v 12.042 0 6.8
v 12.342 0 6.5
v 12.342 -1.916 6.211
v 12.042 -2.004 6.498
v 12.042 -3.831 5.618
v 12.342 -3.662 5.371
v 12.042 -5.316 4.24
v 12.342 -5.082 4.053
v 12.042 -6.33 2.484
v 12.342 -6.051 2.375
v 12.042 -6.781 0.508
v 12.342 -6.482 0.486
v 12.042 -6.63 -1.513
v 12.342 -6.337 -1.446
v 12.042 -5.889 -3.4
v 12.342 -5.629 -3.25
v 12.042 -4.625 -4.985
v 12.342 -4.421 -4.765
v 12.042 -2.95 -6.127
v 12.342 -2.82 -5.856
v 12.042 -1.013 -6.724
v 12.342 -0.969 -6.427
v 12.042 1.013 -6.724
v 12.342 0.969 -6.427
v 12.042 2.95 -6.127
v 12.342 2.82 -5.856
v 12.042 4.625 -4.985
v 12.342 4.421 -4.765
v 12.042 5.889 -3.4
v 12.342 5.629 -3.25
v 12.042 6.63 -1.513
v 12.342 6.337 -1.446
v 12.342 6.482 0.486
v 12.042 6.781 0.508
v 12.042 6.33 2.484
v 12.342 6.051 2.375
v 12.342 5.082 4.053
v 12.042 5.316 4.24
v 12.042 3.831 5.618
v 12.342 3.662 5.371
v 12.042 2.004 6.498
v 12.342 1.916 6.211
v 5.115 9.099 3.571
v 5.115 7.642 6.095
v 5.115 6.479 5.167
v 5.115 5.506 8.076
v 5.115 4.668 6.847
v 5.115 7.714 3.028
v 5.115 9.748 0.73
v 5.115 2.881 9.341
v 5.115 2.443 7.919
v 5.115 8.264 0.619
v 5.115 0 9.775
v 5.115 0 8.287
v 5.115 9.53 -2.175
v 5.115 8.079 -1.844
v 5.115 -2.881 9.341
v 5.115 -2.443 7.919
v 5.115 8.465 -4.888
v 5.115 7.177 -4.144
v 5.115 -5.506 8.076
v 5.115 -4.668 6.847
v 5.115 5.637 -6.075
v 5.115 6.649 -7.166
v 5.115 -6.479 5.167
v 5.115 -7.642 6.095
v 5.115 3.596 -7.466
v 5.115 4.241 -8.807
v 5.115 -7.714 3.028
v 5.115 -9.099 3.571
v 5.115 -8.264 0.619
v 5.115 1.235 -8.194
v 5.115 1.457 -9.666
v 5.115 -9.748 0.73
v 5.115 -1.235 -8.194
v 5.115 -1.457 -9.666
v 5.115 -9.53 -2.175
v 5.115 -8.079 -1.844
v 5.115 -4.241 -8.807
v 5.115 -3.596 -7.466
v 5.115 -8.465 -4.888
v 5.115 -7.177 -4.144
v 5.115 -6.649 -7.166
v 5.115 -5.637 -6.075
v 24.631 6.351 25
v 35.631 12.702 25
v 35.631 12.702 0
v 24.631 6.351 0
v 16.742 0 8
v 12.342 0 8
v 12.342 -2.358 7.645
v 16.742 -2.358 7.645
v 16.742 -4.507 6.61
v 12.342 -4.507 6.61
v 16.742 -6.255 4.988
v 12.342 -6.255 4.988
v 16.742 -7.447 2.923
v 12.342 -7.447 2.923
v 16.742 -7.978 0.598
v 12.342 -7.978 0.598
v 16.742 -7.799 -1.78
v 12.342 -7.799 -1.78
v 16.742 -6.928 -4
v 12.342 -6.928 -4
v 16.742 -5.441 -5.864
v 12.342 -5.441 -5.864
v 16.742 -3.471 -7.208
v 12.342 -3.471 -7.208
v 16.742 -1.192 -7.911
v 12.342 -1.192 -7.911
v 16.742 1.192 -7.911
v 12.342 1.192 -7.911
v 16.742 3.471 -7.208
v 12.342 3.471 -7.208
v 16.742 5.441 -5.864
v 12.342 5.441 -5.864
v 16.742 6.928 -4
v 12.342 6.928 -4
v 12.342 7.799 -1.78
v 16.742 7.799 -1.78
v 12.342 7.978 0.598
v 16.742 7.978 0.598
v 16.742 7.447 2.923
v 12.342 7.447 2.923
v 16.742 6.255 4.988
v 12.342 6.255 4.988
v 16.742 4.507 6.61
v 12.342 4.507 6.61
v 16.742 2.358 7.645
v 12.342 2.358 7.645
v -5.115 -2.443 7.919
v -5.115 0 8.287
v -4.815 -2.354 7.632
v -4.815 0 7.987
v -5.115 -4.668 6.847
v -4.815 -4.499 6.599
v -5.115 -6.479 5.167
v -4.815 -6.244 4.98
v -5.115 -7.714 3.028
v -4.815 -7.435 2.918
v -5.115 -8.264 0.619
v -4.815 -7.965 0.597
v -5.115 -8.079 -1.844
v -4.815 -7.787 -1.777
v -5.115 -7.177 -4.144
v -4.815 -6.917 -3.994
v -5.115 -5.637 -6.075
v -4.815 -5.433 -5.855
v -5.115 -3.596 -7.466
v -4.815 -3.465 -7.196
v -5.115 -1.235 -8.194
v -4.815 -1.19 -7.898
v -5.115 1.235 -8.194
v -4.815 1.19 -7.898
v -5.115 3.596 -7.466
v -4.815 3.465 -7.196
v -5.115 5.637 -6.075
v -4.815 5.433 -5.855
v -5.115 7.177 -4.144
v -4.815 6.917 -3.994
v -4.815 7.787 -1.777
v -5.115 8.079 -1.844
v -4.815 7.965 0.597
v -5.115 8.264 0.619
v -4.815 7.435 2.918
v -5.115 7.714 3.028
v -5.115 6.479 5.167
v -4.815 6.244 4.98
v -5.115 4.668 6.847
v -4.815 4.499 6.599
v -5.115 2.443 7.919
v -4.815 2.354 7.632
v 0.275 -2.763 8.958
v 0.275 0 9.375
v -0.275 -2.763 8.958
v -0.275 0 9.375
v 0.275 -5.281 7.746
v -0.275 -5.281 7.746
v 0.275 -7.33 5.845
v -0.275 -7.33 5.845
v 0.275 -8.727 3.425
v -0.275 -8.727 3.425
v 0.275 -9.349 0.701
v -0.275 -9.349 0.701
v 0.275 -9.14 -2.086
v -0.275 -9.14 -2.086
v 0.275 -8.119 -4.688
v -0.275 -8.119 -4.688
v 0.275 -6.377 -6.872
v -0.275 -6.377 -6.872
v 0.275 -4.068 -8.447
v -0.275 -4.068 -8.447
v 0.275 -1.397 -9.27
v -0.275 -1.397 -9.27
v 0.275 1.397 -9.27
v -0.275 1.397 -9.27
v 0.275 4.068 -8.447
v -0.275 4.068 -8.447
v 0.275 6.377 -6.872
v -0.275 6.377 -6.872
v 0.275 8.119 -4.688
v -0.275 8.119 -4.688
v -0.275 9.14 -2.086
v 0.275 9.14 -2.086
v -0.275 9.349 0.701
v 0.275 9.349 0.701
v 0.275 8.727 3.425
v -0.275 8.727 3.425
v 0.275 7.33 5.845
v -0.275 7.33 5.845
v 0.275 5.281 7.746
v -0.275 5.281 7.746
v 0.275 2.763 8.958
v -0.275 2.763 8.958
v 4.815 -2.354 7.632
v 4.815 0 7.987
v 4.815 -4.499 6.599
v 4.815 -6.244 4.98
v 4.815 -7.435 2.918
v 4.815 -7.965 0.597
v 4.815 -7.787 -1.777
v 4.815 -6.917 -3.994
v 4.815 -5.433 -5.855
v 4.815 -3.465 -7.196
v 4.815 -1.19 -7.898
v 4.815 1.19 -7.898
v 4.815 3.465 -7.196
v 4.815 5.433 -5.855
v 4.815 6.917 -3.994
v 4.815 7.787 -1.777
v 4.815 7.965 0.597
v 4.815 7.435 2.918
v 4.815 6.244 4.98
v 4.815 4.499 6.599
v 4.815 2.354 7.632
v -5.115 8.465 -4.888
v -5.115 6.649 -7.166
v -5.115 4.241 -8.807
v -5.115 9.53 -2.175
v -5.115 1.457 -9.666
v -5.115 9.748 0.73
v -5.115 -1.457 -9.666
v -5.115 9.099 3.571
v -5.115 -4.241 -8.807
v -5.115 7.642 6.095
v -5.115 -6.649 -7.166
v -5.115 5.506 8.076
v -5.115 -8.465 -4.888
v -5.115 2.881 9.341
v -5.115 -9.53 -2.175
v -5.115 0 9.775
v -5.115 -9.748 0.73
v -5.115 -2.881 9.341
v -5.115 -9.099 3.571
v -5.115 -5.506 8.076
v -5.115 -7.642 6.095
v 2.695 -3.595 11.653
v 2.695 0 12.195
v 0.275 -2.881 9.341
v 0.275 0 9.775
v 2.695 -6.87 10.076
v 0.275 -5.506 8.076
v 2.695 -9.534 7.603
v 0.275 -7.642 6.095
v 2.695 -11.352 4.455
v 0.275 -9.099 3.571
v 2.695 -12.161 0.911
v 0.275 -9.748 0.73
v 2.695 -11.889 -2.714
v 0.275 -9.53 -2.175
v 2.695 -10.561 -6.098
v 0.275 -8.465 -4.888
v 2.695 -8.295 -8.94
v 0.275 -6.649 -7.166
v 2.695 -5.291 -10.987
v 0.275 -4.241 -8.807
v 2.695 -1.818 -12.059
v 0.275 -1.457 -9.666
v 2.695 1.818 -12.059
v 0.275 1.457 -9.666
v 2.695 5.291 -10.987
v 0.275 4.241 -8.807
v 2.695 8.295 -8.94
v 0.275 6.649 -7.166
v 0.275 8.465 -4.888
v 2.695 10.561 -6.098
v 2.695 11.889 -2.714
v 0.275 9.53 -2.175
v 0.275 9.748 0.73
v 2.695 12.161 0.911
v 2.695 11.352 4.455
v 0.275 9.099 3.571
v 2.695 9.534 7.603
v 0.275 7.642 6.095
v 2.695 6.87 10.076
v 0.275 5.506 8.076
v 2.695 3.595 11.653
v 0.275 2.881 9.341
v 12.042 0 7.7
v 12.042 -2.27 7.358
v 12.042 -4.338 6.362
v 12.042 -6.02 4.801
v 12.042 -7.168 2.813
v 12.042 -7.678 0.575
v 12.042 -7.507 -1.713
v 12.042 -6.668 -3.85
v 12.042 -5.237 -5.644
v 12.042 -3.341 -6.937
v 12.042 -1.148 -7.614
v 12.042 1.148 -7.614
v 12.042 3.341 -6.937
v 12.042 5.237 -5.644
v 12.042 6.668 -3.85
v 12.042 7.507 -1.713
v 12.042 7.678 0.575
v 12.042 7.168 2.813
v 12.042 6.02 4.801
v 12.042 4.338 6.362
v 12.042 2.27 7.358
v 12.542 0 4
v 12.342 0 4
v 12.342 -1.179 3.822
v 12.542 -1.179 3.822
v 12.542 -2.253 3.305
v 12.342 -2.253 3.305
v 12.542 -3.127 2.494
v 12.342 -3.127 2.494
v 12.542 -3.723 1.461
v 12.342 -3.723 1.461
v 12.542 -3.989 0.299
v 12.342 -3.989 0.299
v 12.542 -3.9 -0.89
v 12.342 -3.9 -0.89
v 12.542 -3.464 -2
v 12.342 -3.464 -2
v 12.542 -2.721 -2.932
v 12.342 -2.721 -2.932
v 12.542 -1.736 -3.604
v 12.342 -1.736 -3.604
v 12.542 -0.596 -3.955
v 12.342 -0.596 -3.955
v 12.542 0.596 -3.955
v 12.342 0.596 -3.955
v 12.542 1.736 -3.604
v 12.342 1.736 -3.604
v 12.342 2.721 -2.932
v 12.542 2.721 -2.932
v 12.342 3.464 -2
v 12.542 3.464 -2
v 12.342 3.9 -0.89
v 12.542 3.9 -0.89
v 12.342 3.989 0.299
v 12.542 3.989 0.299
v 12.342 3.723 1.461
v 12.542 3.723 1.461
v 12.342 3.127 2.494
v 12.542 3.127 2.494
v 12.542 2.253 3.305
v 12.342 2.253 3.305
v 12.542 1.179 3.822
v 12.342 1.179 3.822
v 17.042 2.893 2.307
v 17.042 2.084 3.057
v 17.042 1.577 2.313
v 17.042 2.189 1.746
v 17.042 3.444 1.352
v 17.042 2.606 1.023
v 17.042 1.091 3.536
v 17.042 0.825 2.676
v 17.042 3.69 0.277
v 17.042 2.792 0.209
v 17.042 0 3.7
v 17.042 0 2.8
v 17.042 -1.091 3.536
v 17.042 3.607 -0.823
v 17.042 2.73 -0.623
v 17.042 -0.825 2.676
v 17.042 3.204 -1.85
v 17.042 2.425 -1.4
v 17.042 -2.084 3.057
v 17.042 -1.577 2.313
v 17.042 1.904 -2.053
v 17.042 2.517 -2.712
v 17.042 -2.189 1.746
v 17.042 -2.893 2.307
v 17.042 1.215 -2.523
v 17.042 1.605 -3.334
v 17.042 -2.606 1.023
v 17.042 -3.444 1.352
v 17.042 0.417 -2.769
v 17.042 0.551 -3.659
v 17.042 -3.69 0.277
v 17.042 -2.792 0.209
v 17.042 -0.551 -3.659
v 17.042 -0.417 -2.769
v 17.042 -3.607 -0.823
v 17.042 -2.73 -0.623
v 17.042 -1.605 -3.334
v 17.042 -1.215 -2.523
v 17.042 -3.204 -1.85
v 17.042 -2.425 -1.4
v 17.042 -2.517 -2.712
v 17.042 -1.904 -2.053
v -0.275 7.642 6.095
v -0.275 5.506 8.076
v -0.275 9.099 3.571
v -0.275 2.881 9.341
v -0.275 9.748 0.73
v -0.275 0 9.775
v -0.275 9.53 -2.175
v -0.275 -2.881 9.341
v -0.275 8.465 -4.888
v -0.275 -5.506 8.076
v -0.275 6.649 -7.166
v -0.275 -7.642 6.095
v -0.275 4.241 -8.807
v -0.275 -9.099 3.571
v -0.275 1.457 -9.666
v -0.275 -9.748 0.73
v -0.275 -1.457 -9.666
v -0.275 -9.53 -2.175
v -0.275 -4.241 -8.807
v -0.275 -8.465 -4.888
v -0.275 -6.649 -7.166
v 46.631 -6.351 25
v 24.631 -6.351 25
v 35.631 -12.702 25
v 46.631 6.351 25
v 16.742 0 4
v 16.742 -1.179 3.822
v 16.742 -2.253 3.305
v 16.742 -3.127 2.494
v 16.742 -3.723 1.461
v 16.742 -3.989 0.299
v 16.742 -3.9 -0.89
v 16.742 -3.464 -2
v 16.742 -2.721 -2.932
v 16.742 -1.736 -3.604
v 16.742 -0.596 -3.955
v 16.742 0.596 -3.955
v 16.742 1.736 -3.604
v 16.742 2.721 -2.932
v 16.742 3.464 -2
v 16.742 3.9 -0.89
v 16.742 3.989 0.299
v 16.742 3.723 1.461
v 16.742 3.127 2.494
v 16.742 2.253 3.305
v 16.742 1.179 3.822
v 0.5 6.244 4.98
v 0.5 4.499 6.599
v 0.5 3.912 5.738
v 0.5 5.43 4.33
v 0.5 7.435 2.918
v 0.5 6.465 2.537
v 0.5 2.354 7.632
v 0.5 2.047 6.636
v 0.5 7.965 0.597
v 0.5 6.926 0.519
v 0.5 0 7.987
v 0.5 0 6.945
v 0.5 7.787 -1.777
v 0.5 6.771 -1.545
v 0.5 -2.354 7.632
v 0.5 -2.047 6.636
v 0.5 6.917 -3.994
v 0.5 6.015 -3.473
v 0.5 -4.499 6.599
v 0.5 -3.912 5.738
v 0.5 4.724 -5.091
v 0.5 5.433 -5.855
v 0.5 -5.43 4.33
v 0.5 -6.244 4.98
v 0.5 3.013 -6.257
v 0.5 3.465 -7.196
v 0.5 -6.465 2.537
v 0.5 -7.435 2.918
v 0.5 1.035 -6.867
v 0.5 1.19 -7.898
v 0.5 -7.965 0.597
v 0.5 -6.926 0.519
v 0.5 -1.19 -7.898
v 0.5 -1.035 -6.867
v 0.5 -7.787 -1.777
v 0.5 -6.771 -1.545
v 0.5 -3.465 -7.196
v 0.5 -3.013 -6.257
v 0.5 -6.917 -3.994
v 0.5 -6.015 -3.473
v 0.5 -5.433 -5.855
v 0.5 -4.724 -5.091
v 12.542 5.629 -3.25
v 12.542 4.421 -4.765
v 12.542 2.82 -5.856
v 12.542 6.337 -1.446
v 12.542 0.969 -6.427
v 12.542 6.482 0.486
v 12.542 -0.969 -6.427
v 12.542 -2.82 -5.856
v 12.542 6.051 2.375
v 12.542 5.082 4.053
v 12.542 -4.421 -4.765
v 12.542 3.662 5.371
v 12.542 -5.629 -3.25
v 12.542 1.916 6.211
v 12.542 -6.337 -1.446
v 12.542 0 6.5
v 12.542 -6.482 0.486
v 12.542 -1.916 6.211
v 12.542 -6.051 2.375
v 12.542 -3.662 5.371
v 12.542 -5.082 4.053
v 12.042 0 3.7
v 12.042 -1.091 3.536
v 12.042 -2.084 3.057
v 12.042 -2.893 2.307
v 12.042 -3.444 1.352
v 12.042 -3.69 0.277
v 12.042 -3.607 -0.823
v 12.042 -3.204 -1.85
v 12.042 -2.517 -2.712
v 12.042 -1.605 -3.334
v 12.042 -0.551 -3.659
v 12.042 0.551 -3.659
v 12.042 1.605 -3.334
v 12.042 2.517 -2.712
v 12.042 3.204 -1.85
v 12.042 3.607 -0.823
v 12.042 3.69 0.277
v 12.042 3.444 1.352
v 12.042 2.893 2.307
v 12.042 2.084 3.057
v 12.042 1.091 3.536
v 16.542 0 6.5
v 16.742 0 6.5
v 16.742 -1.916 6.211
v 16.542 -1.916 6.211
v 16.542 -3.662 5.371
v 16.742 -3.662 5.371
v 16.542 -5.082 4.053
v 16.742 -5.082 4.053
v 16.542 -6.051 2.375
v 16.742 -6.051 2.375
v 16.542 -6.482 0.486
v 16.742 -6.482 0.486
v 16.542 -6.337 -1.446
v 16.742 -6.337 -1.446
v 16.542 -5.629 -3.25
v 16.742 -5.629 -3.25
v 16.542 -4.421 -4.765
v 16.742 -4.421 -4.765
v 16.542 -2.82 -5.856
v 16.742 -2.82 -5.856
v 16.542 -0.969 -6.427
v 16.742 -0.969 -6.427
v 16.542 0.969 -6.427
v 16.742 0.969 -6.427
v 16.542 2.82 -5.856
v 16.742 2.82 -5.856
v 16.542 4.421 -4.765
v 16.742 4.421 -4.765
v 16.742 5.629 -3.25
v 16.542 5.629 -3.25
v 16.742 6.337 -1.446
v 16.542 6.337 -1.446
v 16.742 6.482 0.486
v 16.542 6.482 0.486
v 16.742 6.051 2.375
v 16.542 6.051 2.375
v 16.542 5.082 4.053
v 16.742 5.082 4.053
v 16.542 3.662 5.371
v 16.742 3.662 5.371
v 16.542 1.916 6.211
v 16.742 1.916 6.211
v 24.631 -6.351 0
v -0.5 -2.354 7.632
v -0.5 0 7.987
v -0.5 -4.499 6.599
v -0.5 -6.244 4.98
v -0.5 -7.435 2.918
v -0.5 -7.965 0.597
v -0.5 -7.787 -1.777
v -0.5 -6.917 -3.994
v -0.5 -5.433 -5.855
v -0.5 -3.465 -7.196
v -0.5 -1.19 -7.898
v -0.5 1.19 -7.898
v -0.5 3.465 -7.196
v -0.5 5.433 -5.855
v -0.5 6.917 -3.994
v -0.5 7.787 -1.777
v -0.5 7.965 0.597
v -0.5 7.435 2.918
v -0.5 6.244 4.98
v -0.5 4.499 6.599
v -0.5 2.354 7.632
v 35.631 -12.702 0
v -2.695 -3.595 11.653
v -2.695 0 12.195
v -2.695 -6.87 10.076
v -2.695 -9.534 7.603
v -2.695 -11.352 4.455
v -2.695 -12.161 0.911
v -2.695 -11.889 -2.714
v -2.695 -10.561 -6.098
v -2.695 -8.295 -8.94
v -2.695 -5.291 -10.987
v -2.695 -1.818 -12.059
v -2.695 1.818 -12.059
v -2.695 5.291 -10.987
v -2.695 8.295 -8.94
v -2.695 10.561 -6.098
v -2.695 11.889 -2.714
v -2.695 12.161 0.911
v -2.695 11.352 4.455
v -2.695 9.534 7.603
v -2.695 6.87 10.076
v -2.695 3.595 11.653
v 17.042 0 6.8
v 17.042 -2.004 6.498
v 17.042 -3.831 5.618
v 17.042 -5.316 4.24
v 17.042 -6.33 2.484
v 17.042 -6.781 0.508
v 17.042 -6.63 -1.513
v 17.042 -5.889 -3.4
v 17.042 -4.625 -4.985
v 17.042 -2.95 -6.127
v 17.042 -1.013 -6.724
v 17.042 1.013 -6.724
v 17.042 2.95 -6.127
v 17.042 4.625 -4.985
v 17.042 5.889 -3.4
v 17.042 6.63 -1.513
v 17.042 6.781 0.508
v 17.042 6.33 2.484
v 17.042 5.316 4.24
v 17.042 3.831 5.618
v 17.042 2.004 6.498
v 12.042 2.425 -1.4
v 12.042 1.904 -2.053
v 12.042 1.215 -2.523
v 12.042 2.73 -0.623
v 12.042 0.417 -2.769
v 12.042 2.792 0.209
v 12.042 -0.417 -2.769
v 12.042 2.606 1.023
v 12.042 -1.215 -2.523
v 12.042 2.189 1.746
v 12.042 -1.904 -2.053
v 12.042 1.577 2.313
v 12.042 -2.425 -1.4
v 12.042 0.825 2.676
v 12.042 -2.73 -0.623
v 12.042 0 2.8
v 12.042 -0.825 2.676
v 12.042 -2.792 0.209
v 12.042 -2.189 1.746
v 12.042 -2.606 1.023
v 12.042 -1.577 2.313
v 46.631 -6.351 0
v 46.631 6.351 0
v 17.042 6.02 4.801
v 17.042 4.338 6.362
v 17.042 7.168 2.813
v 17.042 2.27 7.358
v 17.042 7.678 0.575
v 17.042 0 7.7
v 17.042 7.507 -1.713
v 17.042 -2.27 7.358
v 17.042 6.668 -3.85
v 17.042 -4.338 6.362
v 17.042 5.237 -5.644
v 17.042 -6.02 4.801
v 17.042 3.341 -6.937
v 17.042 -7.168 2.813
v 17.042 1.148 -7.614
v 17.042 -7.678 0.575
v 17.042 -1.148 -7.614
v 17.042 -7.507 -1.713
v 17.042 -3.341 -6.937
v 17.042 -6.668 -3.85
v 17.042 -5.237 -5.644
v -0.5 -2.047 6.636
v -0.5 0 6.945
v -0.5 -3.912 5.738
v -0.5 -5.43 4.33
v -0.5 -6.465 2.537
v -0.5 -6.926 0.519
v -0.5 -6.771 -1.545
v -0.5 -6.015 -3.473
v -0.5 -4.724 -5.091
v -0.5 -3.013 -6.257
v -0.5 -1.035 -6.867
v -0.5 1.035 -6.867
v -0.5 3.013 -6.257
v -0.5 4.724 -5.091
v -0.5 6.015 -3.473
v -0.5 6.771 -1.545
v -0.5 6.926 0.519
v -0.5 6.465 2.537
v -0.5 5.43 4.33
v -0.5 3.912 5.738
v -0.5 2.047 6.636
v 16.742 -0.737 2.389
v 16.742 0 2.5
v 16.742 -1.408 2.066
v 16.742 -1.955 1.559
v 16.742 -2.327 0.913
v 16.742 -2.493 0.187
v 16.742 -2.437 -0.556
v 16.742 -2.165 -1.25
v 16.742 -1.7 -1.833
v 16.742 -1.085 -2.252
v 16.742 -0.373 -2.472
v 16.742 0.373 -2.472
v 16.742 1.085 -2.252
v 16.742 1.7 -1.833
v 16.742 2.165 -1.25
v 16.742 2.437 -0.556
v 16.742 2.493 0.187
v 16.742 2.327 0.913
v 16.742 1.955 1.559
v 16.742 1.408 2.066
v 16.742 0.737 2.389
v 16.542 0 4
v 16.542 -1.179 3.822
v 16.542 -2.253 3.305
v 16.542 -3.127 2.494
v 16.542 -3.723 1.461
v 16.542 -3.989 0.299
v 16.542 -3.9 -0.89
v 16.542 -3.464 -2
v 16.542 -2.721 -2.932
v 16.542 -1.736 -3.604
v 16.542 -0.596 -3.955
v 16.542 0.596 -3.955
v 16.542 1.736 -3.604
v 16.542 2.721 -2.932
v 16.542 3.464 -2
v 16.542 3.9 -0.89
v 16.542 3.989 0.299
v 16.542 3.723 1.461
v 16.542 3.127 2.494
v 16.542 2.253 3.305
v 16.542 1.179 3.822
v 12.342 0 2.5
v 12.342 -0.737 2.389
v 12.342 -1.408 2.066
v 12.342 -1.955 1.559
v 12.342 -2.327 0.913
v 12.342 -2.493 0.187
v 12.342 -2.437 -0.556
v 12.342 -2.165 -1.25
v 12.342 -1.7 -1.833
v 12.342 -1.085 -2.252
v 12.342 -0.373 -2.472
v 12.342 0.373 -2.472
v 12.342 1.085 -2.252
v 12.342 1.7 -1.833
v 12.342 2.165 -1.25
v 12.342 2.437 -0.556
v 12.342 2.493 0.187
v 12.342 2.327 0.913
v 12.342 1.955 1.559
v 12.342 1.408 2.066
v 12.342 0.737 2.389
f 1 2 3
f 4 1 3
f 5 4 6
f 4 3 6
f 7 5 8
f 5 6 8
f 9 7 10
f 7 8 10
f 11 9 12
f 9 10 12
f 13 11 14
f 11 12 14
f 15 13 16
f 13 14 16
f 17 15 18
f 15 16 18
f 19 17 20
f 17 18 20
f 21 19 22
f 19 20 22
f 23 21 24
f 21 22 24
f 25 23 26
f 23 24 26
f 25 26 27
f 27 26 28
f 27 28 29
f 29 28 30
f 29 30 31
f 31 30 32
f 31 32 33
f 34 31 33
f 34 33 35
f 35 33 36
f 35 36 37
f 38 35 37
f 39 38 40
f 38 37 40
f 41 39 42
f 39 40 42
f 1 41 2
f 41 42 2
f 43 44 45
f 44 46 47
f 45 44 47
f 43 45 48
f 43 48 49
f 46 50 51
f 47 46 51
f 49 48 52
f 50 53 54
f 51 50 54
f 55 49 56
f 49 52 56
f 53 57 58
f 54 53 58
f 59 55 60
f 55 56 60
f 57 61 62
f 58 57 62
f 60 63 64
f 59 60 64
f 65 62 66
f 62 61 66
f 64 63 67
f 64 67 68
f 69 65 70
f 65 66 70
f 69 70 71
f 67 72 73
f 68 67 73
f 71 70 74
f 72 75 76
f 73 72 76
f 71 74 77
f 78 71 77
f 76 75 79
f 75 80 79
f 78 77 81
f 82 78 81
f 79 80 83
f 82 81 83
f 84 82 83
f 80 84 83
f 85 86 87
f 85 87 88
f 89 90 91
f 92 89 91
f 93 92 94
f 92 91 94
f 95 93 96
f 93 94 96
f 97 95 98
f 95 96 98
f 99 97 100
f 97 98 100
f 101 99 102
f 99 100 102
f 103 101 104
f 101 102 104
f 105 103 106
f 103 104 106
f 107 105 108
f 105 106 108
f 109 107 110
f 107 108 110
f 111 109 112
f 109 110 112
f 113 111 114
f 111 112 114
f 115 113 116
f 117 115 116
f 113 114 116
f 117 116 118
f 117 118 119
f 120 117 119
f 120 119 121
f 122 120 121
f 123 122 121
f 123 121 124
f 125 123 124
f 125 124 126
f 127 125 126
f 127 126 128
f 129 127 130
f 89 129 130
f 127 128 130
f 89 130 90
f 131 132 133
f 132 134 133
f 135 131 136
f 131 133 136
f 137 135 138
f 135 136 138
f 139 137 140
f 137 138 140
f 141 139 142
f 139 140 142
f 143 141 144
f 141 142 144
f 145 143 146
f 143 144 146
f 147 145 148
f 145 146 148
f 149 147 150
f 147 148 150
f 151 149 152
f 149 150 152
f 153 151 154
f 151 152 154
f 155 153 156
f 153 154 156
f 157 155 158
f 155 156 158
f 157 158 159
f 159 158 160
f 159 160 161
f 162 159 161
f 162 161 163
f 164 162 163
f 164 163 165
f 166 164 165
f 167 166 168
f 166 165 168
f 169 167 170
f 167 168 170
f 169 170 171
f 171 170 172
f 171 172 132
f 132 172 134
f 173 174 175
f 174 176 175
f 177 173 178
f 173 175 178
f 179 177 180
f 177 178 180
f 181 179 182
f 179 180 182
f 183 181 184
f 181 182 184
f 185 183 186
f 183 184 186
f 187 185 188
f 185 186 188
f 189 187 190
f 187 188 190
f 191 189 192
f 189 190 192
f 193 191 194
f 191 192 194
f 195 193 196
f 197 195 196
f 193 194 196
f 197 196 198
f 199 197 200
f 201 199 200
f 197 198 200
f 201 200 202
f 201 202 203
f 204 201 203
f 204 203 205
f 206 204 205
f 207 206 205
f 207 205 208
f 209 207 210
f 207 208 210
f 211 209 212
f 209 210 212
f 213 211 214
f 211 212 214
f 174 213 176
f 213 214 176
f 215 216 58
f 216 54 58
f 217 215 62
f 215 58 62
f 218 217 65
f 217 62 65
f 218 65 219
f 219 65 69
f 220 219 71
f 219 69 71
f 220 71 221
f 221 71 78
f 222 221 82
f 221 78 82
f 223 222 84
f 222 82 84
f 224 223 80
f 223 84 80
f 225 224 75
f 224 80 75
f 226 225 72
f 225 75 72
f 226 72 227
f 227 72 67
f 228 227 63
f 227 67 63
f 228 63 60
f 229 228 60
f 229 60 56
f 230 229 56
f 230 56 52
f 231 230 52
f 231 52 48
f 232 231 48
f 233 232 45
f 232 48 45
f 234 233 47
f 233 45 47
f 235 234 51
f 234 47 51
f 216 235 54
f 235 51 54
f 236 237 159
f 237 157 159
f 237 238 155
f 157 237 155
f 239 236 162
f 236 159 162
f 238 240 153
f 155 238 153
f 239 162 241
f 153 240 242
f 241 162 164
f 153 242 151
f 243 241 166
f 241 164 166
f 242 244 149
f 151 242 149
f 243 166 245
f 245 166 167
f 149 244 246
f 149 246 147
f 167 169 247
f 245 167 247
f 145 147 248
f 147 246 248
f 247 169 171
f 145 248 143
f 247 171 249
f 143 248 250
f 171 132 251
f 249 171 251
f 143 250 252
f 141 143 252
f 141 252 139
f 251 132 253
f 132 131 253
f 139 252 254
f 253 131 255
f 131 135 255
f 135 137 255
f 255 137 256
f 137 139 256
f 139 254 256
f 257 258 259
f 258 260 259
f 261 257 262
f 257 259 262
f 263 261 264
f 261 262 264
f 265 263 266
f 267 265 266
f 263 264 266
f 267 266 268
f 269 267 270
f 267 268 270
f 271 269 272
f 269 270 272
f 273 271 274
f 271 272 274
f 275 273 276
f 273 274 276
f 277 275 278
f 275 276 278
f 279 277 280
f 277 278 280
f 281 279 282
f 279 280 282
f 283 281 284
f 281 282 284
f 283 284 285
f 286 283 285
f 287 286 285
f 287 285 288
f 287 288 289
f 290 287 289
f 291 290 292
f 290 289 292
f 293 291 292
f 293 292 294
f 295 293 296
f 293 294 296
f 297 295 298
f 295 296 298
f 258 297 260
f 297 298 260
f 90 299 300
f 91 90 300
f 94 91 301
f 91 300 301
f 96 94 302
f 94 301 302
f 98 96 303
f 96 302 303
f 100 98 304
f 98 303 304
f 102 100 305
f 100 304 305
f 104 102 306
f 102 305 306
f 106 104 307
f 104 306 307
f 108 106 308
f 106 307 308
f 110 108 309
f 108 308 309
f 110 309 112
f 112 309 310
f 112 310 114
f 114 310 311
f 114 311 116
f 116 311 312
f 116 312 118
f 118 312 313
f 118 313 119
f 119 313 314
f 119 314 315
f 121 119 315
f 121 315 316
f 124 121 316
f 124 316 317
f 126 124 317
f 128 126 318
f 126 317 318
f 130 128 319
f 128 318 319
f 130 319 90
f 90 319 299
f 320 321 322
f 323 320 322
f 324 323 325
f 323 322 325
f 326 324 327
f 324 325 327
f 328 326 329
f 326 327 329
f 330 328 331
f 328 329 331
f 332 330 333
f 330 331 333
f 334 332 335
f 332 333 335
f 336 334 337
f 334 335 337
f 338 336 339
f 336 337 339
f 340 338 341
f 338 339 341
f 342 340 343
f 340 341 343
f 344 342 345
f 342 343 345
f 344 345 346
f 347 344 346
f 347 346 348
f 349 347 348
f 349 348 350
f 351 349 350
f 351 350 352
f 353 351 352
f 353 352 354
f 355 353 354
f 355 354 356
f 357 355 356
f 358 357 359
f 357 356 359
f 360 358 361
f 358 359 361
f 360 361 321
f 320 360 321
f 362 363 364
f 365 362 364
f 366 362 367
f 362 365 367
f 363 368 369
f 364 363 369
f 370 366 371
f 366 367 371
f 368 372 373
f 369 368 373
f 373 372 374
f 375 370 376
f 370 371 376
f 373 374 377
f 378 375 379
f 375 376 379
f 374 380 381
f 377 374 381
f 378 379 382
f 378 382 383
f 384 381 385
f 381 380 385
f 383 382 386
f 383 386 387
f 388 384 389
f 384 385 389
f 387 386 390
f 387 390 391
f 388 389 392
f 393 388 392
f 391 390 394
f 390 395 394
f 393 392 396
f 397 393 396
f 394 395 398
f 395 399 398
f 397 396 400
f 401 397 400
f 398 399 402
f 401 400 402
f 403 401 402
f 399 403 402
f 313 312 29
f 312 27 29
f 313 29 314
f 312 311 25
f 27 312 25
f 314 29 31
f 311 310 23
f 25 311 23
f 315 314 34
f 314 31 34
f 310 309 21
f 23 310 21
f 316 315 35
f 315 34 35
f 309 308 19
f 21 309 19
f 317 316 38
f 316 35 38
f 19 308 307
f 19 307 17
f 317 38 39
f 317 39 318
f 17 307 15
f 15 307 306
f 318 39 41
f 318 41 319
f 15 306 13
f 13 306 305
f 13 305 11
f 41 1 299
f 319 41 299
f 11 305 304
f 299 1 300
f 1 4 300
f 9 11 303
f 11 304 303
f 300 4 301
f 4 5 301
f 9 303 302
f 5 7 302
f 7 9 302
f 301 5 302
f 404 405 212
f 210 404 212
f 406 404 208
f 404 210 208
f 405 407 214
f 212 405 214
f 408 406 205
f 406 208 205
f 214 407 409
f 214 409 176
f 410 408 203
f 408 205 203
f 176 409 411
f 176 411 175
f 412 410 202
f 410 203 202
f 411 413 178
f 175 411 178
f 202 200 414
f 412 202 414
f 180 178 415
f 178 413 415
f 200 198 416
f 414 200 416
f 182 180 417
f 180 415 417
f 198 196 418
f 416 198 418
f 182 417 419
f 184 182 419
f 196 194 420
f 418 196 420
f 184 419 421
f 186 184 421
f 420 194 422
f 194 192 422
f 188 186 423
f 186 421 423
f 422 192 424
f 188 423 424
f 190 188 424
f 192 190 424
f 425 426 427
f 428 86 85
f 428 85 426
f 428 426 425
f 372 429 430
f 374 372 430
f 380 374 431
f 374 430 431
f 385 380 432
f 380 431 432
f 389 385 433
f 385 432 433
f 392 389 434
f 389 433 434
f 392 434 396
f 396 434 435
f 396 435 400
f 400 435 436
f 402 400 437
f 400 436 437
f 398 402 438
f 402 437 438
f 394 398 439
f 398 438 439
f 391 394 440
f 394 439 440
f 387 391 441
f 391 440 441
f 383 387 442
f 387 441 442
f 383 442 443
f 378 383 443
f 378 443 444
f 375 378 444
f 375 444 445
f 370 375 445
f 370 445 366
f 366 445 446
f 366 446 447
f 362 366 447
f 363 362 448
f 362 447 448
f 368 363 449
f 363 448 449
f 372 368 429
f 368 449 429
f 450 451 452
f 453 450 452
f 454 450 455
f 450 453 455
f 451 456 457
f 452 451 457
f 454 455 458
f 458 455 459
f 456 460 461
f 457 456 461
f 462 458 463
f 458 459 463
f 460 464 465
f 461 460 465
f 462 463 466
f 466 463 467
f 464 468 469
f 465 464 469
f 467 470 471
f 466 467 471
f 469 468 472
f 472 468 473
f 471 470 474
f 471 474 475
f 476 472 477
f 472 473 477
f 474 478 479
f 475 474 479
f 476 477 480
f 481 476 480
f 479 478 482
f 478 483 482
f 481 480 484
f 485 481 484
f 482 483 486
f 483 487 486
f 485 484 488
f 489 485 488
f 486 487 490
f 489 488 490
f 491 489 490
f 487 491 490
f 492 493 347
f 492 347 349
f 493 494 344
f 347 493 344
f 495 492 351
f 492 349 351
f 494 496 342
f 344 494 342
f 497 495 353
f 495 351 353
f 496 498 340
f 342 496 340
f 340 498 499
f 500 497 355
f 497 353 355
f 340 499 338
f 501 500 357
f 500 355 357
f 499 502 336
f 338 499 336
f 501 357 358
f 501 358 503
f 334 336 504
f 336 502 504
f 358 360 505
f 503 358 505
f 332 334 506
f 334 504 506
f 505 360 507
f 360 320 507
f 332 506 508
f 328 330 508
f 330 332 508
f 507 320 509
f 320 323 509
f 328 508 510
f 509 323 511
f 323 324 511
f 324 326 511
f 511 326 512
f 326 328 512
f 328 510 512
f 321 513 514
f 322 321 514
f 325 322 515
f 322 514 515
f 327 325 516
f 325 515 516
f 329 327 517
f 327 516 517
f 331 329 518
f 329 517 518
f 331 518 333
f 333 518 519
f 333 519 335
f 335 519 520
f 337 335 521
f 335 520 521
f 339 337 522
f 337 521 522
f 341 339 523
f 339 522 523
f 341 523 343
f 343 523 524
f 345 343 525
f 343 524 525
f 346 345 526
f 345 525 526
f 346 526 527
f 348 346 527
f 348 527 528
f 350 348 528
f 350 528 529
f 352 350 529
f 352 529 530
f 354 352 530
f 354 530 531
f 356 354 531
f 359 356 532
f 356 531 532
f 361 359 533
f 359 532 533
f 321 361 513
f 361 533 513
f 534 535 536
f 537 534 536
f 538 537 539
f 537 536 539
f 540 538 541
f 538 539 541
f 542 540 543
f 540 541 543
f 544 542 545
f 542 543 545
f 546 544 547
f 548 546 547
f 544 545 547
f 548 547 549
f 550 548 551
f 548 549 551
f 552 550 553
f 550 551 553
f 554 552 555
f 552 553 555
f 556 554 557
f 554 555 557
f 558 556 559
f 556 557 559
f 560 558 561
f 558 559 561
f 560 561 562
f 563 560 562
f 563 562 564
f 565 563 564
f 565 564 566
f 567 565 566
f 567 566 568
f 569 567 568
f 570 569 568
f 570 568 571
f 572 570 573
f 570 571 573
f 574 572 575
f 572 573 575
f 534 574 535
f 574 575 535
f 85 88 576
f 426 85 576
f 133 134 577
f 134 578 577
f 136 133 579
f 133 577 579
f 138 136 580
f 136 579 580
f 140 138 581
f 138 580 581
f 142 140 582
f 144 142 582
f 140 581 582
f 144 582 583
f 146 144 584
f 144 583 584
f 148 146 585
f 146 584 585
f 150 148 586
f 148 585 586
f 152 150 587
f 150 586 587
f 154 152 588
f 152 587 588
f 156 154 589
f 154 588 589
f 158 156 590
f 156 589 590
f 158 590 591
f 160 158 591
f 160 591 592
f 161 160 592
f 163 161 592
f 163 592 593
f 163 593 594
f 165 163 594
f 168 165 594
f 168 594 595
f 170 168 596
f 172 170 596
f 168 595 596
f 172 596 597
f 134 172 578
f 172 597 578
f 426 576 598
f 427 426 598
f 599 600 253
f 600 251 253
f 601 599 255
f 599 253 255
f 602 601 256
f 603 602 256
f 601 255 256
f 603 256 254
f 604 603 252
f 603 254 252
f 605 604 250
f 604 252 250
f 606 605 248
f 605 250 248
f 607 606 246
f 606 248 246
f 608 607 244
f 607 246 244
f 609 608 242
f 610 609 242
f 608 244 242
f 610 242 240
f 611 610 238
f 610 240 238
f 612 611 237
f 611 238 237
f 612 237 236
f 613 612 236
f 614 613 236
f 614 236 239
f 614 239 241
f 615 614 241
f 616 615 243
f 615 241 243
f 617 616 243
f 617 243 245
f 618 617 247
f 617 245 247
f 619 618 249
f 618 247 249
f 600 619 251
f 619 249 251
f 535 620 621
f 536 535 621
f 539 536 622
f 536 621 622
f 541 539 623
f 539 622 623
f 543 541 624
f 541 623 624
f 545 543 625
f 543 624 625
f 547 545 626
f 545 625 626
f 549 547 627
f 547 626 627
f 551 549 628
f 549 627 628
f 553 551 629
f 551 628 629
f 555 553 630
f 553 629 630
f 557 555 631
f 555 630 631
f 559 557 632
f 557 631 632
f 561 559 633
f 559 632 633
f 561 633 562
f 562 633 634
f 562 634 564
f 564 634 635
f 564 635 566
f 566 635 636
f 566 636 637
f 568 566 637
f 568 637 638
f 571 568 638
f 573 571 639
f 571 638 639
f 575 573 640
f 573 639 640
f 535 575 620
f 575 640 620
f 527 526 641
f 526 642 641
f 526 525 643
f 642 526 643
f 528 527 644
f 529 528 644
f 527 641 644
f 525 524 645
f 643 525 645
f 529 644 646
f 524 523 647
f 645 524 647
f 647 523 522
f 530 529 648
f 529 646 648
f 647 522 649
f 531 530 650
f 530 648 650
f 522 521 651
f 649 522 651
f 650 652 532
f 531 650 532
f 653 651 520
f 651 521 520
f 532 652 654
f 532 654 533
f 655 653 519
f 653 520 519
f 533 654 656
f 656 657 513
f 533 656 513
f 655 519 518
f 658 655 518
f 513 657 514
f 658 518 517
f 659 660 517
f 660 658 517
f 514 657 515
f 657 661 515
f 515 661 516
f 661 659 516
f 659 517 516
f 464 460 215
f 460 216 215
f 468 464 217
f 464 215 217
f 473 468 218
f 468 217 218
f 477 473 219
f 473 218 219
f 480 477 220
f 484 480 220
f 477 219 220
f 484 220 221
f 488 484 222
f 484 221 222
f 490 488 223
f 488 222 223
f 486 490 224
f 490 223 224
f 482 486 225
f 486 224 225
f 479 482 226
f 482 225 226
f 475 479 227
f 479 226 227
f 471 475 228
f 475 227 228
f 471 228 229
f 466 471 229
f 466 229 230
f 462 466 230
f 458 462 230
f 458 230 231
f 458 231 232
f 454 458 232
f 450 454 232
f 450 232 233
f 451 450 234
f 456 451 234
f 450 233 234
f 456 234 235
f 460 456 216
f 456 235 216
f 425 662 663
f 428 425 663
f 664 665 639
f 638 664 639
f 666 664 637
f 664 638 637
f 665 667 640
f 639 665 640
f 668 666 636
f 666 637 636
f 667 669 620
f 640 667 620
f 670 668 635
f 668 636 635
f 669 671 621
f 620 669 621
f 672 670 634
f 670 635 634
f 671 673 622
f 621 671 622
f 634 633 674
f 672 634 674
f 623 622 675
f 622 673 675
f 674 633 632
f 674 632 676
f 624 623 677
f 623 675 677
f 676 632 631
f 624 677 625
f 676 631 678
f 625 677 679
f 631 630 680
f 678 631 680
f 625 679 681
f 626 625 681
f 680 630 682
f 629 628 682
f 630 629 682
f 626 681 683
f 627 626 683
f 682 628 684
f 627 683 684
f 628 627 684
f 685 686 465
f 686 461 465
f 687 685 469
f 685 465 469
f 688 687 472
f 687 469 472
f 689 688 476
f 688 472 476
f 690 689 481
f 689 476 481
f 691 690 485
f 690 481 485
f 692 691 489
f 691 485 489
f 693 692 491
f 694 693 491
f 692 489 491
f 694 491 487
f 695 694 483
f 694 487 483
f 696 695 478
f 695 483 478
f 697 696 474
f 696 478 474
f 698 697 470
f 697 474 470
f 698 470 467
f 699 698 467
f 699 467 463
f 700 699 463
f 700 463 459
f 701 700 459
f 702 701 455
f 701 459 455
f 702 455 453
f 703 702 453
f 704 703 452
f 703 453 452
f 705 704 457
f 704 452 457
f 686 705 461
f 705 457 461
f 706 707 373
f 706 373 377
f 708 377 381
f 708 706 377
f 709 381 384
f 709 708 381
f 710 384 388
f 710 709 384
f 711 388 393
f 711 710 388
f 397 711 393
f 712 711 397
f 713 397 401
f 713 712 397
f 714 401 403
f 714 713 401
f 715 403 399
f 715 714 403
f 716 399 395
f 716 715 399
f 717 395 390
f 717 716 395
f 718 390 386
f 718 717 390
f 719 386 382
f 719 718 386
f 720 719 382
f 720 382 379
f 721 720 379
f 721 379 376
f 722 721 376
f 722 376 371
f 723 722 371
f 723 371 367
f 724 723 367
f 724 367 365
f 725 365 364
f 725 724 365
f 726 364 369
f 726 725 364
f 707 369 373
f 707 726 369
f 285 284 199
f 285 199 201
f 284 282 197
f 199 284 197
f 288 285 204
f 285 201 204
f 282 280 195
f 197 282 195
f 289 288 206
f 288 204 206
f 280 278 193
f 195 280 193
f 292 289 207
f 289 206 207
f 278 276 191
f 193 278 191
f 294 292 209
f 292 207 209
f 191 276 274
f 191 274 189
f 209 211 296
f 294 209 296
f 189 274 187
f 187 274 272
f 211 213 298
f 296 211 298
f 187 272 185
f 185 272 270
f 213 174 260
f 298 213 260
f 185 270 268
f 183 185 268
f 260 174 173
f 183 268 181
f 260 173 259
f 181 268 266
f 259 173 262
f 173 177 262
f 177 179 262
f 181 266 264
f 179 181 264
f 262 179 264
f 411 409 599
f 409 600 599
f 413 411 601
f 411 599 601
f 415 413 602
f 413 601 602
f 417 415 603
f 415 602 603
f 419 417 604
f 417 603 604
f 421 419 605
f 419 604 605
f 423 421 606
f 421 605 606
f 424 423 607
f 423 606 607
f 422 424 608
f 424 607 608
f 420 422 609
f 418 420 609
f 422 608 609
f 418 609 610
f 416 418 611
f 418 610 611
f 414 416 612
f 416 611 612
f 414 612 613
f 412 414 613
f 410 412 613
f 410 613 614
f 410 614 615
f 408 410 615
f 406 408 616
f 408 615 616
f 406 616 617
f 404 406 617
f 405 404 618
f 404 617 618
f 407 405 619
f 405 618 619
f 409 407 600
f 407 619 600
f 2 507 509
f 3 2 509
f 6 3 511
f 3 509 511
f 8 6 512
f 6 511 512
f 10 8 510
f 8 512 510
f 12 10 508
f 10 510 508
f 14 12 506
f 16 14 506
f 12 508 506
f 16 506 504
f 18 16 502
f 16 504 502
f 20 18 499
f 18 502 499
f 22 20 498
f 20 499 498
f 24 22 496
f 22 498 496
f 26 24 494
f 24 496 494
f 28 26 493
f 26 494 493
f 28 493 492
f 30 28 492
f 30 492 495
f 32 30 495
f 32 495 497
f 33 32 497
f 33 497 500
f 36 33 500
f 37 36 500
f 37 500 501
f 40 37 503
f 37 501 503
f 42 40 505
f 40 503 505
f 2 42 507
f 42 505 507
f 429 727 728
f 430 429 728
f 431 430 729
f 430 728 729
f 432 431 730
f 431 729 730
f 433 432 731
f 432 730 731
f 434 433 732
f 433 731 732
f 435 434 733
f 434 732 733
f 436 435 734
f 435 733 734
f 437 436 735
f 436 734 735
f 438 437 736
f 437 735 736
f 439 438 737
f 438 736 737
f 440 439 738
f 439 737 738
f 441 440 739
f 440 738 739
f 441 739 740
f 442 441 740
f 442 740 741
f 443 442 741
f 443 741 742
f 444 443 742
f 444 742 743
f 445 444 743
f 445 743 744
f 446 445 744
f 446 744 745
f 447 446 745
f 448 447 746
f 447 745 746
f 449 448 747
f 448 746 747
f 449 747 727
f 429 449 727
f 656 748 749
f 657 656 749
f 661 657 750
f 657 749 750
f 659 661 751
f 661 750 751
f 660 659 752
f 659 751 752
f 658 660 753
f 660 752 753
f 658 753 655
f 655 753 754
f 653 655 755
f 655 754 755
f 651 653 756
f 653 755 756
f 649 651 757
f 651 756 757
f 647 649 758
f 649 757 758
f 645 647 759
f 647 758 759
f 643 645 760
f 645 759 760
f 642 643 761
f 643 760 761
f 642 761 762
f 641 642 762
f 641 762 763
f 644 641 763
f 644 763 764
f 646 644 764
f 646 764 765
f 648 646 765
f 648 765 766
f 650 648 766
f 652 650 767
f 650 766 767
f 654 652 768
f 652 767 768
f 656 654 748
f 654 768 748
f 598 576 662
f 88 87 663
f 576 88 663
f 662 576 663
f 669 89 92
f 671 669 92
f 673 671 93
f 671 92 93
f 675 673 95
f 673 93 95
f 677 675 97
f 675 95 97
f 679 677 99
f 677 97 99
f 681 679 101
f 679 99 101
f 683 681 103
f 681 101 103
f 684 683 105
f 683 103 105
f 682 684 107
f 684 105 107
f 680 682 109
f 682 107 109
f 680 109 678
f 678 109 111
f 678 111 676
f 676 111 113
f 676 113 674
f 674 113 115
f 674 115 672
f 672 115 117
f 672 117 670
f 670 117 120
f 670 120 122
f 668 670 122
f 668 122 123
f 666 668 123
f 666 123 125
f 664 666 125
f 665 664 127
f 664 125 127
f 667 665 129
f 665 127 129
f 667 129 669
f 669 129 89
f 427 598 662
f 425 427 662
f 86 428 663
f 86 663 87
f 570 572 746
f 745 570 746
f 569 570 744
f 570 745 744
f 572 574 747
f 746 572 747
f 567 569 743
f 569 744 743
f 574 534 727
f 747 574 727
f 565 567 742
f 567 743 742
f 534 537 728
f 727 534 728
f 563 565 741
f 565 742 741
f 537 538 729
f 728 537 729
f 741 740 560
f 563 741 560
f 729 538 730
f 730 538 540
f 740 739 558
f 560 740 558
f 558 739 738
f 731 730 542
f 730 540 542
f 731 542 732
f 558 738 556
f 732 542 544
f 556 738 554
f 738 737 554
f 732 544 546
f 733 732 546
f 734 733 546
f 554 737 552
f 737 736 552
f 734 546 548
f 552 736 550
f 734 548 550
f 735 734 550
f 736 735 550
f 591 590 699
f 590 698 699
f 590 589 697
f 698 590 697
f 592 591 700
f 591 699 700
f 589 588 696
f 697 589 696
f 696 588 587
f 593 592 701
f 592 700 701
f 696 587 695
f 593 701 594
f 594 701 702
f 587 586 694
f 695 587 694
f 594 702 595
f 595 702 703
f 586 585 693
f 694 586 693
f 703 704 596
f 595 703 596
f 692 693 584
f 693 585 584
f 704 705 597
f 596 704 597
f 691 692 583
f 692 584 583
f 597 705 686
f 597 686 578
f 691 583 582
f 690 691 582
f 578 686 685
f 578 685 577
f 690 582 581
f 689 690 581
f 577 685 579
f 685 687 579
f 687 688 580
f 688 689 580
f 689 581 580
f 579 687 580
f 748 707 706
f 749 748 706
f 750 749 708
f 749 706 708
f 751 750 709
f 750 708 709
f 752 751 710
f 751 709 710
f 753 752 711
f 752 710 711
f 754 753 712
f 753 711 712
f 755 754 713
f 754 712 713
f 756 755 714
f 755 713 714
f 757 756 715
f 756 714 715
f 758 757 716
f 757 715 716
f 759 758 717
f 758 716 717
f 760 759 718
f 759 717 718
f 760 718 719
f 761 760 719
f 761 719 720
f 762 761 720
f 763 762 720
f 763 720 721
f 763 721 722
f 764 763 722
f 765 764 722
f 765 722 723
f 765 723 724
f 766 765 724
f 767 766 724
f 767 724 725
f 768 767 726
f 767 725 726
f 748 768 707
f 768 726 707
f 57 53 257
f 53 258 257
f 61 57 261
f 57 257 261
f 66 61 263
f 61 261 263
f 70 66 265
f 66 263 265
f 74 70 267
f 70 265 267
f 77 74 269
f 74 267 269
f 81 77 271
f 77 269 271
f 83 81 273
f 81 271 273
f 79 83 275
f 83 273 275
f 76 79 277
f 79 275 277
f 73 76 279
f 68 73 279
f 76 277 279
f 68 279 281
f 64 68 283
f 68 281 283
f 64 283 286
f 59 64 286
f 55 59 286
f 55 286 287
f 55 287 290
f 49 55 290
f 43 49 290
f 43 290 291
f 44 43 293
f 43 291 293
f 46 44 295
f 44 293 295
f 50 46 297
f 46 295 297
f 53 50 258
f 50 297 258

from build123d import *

# Parameters (mm, degrees)
F4_SIZE  = 0.3
F6_DEPTH = 25


with BuildPart() as f1:
    # F0 (on Front) → F1 (revolve)
    with BuildSketch(Plane.XZ):
        Polygon((-0.5, 6.945), (0, 6.945), (0.5, 6.945), (0.5, 7.987), (4.815, 7.987), (5.115, 8.287), (5.115, 9.775), (2.695, 12.195), (0.275, 9.775), (0.275, 9.375), (0, 9.375), (-0.275, 9.375), (-0.275, 9.775), (-2.695, 12.195), (-5.115, 9.775), (-5.115, 8.287), (-4.815, 7.987), (-0.5, 7.987), align=None)
    revolve(axis=Axis((0, 0, 0), (1, 0, 0)))


with BuildPart() as f3:
    # F2 (on Front) → F3 (revolve)
    with BuildSketch(Plane.XZ):
        Polygon((14.542001, 2.5), (17.042001, 2.5), (17.042001, 4), (16.542001, 4), (16.542001, 6.5), (17.042001, 6.5), (17.042001, 8), (14.542001, 8), (12.042001, 8), (12.042001, 6.5), (12.542001, 6.5), (12.542001, 4), (12.042001, 4), (12.042001, 2.5), align=None)
    revolve(axis=Axis((14.613577, 0, 0), (1, 0, 0)))

    # F4
    f4_edges = [f3.edges().sort_by_distance(p)[0] for p in [
        (12.042001, 0, -8),
        (17.042001, 0, -8),
        (17.042001, 0, -4),
        (17.042001, 0, -2.5),
        (12.042001, 0, -2.5),
        (12.042001, 0, -4),
        (12.042001, 0, -6.5),
        (17.042001, 0, -6.5),
    ]]
    chamfer(f4_edges, length=F4_SIZE)


with BuildPart() as f6:
    # F5 (on Top) → F6 (new body)
    with BuildSketch(Plane.XY):
        Polygon((35.631485, -12.701706), (46.631485, -6.350853), (46.631485, 6.350853), (35.631485, 12.701706), (24.631485, 6.350853), (24.631485, -6.350853), align=None)
    extrude(amount=F6_DEPTH)


solid = Compound([f1.part, f3.part, f6.part])
